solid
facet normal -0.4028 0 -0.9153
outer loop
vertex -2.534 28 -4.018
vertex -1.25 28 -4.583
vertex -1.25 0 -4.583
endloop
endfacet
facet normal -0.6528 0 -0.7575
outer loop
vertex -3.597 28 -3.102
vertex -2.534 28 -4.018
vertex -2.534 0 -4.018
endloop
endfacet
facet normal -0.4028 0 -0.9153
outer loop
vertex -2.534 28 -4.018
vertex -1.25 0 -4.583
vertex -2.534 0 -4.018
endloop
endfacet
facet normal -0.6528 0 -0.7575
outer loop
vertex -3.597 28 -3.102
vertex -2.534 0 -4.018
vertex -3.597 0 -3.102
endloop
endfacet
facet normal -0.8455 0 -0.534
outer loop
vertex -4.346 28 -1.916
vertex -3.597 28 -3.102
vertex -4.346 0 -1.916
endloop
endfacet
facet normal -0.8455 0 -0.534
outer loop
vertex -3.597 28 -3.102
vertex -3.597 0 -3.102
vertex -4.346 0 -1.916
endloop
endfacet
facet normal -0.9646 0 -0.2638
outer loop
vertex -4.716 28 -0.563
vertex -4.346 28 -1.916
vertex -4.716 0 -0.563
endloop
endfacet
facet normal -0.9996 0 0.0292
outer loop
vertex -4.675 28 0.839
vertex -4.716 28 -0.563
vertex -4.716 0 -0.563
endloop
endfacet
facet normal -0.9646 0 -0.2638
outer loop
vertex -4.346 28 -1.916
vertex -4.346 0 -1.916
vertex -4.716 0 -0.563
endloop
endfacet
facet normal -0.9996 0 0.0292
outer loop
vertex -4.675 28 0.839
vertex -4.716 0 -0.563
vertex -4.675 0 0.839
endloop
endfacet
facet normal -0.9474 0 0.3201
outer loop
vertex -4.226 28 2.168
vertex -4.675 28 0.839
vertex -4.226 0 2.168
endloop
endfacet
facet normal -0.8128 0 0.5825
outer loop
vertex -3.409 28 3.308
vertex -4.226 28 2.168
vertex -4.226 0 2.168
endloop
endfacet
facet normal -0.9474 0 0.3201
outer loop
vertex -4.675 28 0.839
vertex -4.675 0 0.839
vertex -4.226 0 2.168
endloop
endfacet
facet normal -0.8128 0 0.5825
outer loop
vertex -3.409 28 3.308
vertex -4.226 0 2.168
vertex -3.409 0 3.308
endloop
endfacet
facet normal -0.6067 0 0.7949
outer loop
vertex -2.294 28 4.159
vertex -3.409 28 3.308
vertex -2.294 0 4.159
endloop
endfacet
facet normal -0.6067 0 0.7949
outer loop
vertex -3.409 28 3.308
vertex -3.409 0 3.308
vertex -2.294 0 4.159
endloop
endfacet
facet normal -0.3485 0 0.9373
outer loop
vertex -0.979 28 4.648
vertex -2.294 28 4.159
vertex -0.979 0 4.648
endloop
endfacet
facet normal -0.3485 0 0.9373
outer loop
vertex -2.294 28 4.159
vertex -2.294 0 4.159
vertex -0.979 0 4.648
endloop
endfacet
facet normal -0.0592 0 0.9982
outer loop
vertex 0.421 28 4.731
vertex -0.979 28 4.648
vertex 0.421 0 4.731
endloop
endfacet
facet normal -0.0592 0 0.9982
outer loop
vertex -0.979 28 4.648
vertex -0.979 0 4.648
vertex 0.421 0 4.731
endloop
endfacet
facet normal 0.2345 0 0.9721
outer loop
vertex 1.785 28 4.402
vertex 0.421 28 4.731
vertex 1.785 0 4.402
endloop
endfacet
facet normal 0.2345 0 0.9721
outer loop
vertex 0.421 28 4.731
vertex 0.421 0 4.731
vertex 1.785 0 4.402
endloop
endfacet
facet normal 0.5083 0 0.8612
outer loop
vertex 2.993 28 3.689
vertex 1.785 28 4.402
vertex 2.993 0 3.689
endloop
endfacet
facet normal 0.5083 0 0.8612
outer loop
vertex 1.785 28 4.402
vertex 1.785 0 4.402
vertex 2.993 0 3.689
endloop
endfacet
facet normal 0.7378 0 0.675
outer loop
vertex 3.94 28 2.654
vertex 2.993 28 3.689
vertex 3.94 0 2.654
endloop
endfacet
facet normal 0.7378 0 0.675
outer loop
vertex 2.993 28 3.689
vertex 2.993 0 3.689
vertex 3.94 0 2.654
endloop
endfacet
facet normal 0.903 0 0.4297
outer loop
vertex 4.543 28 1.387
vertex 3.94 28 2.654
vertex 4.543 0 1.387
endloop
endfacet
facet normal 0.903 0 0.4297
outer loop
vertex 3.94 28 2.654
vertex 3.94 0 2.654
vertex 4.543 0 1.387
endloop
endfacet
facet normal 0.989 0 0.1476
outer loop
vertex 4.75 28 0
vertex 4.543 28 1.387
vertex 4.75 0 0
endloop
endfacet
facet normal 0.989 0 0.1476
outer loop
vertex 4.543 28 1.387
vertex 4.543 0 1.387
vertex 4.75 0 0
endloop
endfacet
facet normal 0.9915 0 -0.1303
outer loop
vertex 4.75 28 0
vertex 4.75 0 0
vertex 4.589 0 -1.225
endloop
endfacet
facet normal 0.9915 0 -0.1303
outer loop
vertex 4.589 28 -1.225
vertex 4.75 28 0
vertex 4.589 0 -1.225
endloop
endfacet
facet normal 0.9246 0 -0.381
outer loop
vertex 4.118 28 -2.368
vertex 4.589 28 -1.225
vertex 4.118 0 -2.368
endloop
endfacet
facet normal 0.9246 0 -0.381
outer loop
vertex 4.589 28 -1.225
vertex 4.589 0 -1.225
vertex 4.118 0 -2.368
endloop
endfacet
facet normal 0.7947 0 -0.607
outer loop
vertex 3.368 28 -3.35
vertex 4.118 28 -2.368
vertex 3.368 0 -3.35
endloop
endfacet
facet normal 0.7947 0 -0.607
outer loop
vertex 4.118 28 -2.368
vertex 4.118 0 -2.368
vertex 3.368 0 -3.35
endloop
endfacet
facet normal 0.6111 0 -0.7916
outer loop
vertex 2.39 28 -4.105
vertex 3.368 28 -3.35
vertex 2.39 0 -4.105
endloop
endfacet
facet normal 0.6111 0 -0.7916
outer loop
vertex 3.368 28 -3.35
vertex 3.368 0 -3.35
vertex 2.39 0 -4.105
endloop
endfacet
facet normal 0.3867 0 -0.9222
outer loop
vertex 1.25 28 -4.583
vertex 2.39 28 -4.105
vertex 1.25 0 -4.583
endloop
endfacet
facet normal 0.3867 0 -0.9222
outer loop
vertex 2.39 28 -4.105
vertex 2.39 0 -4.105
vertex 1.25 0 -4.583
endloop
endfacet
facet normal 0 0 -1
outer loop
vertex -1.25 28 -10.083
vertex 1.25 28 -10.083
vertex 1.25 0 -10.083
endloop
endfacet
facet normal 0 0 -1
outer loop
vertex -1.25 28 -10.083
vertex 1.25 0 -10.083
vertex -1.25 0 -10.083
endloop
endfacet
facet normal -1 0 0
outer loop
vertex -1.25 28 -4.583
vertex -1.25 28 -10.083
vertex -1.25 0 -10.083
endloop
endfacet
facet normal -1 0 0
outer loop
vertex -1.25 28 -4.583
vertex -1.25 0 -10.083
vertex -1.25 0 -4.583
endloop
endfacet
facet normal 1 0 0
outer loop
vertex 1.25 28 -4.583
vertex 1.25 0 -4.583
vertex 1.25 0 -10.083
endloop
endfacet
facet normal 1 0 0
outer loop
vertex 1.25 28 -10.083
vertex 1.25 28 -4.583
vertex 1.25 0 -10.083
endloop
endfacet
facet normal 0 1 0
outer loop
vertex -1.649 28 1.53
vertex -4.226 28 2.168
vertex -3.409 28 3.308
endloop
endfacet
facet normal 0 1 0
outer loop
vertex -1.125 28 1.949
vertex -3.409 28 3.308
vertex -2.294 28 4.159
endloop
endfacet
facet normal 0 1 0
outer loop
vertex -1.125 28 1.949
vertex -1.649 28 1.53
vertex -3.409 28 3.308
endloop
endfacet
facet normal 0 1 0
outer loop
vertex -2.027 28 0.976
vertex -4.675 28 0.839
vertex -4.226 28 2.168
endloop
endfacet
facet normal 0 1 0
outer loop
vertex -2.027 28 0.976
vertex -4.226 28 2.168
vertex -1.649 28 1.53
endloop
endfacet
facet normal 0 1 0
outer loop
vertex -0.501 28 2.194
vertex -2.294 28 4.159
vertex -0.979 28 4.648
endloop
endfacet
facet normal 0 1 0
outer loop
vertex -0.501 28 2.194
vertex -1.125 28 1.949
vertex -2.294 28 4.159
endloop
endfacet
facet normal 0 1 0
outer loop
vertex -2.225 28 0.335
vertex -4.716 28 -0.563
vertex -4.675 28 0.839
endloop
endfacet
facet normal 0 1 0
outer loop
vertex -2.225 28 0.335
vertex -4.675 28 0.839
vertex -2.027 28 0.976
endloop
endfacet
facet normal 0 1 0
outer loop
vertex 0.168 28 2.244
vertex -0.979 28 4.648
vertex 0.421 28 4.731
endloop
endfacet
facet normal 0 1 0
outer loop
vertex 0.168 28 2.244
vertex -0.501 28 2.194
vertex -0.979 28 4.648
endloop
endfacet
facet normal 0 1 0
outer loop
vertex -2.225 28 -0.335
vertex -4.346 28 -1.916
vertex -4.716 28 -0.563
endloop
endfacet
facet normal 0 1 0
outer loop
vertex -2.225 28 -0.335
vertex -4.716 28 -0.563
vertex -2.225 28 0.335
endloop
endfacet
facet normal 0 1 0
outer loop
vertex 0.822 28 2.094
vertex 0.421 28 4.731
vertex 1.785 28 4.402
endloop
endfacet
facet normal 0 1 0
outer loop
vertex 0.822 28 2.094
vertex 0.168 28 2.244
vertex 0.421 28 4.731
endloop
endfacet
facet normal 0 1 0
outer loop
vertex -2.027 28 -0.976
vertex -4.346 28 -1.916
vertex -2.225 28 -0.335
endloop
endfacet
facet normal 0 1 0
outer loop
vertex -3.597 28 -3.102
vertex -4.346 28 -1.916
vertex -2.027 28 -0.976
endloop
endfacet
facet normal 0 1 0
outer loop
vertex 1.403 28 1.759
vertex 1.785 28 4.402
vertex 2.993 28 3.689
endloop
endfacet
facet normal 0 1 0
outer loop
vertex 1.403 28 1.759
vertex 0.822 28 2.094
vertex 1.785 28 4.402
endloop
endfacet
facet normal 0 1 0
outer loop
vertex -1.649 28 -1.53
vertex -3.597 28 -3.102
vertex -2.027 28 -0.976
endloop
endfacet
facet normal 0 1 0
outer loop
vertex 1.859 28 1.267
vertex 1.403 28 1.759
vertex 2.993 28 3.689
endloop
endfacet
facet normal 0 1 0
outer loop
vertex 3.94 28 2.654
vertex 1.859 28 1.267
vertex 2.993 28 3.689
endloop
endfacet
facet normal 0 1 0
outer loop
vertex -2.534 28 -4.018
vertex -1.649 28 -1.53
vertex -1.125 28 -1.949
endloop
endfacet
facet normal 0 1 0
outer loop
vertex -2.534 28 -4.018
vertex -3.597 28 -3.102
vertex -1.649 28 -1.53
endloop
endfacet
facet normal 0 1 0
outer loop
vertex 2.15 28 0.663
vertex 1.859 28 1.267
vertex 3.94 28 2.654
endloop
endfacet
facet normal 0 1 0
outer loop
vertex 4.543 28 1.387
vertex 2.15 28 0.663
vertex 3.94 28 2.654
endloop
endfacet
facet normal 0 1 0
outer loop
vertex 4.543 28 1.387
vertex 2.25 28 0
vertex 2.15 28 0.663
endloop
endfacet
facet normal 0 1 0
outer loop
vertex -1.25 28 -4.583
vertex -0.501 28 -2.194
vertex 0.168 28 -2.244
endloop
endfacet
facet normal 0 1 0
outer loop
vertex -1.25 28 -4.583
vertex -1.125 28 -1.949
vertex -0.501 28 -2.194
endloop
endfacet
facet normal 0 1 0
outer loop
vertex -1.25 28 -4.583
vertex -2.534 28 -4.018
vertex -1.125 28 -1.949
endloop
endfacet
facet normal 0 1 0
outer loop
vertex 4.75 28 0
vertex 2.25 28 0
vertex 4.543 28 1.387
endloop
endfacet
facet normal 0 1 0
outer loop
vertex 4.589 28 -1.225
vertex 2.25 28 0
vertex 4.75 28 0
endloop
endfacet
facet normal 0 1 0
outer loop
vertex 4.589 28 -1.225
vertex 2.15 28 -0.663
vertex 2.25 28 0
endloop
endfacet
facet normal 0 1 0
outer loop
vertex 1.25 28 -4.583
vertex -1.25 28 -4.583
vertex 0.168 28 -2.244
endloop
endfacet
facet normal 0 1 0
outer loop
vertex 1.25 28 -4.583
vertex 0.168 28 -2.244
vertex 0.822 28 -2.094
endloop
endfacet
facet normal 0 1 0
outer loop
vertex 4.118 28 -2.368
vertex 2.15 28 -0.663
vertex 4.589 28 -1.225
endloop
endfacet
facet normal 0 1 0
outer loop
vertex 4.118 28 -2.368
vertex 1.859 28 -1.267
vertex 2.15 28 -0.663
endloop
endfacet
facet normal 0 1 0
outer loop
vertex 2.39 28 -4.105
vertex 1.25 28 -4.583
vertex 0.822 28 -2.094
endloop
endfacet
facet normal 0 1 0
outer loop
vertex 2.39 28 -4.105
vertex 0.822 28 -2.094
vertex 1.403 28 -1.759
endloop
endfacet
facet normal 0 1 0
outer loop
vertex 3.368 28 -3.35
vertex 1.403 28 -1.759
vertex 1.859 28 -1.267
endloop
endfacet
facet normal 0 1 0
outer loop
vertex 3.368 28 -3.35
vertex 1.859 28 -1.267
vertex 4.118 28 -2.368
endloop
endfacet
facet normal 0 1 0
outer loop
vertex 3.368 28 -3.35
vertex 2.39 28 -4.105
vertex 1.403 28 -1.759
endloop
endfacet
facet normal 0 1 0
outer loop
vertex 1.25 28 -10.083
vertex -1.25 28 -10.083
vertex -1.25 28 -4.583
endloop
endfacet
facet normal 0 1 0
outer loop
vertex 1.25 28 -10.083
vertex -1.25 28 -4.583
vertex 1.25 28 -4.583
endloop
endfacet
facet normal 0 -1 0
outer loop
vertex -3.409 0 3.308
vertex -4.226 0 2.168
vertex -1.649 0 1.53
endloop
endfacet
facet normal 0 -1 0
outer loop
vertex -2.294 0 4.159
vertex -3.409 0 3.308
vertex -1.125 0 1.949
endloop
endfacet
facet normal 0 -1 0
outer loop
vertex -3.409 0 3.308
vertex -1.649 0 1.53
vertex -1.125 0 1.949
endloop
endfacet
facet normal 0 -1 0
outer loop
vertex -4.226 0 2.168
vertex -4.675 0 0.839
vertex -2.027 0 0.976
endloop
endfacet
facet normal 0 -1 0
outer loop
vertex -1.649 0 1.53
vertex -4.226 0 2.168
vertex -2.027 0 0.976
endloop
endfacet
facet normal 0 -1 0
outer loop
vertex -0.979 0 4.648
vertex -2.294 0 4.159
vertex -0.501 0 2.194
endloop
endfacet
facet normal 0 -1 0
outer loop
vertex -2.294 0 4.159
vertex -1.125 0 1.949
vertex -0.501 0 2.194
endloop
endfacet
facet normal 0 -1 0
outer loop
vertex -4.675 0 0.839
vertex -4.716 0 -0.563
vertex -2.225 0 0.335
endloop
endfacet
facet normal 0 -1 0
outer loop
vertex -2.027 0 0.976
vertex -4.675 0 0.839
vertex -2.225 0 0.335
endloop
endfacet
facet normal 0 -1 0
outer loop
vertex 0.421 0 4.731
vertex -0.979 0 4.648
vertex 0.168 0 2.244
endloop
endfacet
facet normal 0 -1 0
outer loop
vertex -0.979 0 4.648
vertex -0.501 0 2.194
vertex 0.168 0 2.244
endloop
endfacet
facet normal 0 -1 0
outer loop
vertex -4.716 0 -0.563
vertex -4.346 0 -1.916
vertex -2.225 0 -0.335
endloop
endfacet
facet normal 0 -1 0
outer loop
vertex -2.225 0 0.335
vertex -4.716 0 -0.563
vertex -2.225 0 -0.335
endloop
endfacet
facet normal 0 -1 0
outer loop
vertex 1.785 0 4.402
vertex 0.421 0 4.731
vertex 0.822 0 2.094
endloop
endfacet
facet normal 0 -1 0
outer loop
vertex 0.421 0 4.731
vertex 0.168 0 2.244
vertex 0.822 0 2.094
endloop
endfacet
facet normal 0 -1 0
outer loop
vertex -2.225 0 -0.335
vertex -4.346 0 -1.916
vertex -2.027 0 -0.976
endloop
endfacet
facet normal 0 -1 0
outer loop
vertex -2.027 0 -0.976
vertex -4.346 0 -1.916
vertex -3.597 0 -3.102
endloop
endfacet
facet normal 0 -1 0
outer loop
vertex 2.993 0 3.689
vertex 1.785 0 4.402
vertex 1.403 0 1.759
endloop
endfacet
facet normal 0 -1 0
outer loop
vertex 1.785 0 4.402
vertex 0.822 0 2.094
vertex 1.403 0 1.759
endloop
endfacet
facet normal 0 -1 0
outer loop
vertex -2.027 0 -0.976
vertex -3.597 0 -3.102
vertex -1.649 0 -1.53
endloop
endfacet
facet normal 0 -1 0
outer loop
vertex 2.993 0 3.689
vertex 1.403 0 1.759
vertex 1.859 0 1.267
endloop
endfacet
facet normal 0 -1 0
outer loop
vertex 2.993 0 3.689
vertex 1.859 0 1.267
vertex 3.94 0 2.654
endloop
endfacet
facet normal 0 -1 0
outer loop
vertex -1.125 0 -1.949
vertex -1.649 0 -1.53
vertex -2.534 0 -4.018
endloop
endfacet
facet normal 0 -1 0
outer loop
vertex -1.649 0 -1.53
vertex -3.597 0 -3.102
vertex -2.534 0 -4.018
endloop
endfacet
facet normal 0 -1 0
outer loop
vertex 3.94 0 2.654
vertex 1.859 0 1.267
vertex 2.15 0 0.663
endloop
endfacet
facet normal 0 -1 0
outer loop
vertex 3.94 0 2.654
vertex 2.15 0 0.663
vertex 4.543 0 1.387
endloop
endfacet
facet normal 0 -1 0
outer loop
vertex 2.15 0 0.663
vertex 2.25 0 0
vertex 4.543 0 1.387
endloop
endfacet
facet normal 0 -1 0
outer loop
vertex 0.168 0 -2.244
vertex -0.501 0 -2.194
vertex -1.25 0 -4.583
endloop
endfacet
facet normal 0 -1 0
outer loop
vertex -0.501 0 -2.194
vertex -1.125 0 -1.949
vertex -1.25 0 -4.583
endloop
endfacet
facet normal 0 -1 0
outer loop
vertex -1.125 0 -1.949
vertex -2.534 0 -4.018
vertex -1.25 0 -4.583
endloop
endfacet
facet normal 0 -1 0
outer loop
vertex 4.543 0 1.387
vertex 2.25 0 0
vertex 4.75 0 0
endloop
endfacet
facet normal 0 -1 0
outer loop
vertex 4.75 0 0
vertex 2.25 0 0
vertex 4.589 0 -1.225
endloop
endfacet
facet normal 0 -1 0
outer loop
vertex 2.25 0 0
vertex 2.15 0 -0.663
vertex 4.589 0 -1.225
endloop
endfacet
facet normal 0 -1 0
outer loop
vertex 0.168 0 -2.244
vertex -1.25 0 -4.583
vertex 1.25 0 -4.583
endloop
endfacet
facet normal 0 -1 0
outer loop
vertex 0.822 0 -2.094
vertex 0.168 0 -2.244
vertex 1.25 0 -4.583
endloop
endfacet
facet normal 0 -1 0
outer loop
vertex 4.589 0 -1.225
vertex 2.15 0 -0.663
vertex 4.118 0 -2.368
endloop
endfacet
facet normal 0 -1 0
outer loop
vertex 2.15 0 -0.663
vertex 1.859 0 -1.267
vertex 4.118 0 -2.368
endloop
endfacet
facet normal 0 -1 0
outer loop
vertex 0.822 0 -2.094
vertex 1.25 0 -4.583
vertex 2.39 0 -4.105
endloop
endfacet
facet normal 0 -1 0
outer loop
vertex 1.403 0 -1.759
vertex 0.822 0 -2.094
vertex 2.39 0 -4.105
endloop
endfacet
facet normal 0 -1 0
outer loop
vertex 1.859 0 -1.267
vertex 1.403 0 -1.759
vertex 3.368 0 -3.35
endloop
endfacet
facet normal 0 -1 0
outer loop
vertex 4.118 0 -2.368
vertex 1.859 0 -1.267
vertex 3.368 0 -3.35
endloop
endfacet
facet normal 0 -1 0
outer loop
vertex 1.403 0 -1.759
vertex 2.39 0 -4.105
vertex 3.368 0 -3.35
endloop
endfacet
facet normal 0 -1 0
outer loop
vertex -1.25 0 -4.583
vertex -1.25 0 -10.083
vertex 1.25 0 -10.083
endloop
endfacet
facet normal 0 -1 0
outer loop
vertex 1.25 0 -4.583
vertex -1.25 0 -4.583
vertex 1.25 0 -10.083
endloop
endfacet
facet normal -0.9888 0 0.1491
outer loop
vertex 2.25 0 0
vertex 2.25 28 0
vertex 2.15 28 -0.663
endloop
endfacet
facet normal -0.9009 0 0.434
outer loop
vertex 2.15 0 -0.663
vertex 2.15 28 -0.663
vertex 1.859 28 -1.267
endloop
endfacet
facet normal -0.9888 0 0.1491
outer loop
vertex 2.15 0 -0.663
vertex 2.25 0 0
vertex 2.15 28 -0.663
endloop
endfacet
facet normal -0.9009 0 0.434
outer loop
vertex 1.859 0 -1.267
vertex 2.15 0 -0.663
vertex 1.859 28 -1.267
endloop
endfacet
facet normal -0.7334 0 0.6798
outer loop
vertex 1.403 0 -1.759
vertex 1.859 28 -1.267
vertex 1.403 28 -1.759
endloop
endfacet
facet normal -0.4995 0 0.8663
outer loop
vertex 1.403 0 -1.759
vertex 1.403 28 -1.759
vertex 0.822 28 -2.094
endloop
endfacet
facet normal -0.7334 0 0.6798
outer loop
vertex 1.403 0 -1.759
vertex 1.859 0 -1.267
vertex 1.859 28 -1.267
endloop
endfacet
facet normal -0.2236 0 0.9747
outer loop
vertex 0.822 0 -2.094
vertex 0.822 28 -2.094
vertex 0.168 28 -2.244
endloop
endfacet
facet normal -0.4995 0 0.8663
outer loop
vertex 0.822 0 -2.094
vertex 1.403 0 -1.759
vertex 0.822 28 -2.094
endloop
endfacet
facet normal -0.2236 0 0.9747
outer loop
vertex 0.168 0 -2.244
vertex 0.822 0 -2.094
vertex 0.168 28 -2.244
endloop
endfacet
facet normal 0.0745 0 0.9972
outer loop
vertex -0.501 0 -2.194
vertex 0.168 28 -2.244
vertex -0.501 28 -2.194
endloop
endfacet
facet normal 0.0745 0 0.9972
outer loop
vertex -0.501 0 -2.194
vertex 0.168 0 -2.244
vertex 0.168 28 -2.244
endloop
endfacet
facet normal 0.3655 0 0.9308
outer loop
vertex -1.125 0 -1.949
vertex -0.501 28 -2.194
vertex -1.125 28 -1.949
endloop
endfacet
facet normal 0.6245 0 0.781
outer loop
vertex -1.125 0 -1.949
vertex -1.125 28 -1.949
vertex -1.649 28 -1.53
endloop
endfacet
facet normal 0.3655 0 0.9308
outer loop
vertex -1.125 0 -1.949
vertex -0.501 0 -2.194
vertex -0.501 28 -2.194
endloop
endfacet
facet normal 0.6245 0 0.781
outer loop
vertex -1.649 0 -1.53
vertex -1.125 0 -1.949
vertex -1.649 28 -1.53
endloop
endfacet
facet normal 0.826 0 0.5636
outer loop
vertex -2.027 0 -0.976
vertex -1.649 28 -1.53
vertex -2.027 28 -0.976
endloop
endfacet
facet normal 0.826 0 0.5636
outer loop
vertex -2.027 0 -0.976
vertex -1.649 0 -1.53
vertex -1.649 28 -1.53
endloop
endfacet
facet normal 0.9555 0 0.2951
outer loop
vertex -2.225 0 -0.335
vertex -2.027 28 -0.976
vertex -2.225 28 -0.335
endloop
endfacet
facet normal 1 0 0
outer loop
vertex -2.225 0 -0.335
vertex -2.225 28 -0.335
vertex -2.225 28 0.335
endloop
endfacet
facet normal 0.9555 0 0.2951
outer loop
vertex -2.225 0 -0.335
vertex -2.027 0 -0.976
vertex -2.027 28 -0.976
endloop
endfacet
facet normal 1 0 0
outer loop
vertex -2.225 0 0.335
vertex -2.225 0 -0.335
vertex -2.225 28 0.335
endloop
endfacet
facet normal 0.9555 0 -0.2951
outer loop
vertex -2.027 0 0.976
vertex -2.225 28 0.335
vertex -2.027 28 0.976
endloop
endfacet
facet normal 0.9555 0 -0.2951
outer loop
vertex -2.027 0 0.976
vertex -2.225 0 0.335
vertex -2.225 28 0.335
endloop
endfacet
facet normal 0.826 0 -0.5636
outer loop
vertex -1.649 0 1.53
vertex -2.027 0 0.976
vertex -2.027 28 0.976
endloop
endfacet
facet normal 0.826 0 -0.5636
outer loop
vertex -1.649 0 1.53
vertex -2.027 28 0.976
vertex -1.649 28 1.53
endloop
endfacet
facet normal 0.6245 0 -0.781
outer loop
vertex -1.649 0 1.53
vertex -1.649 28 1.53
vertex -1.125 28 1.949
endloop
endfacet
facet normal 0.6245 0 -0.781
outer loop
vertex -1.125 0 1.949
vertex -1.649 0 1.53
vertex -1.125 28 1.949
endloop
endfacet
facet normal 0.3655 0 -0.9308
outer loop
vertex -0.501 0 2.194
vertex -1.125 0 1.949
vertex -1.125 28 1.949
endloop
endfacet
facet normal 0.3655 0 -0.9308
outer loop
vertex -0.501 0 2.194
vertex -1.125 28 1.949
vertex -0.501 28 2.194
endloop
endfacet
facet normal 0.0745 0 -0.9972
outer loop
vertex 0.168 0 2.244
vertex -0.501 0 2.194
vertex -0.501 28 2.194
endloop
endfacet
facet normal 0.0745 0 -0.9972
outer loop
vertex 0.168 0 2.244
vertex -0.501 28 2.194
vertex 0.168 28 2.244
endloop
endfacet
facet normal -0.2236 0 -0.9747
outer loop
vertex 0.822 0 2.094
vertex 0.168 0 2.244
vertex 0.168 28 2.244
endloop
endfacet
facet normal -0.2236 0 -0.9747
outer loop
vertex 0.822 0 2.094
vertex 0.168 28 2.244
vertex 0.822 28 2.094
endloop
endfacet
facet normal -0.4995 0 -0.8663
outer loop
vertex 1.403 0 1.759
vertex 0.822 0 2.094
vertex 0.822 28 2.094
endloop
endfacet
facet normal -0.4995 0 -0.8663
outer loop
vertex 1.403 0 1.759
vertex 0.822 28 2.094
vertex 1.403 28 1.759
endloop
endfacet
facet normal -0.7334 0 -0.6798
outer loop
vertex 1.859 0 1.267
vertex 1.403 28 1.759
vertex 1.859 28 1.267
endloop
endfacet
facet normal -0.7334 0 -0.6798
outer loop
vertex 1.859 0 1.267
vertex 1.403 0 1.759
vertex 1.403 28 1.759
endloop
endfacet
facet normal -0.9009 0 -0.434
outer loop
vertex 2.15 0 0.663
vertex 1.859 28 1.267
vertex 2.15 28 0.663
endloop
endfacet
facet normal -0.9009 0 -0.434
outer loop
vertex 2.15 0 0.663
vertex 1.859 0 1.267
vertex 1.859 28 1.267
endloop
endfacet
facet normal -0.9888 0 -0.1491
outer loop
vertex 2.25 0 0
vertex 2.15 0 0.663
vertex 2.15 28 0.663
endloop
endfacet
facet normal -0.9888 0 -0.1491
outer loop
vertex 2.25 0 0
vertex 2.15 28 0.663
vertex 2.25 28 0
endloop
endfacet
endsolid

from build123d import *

# Parameters (mm, degrees)
SKETCH1_R           = 2.25
BOSS_EXTRUDE1_DEPTH = 28


with BuildPart() as part:
    # Sketch1 → Boss-Extrude1 (new body)
    with BuildSketch(Plane(origin=(0, 0, 0), x_dir=(1, 0, 0), z_dir=(0, 1, 0))):
        with BuildLine():
            Line((1.25, 10.082575695), (-1.25, 10.082575695))
            Line((-1.25, 10.082575695), (-1.25, 4.582575695))
            ThreePointArc((-1.25, 4.582575695), (0, 4.75), (1.25, 4.582575695))
            Line((1.25, 4.582575695), (1.25, 10.082575695))
        make_face()
        with BuildLine():
            Line((1.25, 4.582575695), (-1.25, 4.582575695))
            ThreePointArc((-1.25, 4.582575695), (-2.883140649, -3.774917218), (4.75, 0))
            ThreePointArc((4.75, 0), (3.774917218, 2.883140649), (1.25, 4.582575695))
        make_face()
        Circle(SKETCH1_R, mode=Mode.SUBTRACT)
        with BuildLine():
            ThreePointArc((1.25, 4.582575695), (0, 4.75), (-1.25, 4.582575695))
            Line((-1.25, 4.582575695), (1.25, 4.582575695))
        make_face()
    extrude(amount=BOSS_EXTRUDE1_DEPTH)


solid = part.part
